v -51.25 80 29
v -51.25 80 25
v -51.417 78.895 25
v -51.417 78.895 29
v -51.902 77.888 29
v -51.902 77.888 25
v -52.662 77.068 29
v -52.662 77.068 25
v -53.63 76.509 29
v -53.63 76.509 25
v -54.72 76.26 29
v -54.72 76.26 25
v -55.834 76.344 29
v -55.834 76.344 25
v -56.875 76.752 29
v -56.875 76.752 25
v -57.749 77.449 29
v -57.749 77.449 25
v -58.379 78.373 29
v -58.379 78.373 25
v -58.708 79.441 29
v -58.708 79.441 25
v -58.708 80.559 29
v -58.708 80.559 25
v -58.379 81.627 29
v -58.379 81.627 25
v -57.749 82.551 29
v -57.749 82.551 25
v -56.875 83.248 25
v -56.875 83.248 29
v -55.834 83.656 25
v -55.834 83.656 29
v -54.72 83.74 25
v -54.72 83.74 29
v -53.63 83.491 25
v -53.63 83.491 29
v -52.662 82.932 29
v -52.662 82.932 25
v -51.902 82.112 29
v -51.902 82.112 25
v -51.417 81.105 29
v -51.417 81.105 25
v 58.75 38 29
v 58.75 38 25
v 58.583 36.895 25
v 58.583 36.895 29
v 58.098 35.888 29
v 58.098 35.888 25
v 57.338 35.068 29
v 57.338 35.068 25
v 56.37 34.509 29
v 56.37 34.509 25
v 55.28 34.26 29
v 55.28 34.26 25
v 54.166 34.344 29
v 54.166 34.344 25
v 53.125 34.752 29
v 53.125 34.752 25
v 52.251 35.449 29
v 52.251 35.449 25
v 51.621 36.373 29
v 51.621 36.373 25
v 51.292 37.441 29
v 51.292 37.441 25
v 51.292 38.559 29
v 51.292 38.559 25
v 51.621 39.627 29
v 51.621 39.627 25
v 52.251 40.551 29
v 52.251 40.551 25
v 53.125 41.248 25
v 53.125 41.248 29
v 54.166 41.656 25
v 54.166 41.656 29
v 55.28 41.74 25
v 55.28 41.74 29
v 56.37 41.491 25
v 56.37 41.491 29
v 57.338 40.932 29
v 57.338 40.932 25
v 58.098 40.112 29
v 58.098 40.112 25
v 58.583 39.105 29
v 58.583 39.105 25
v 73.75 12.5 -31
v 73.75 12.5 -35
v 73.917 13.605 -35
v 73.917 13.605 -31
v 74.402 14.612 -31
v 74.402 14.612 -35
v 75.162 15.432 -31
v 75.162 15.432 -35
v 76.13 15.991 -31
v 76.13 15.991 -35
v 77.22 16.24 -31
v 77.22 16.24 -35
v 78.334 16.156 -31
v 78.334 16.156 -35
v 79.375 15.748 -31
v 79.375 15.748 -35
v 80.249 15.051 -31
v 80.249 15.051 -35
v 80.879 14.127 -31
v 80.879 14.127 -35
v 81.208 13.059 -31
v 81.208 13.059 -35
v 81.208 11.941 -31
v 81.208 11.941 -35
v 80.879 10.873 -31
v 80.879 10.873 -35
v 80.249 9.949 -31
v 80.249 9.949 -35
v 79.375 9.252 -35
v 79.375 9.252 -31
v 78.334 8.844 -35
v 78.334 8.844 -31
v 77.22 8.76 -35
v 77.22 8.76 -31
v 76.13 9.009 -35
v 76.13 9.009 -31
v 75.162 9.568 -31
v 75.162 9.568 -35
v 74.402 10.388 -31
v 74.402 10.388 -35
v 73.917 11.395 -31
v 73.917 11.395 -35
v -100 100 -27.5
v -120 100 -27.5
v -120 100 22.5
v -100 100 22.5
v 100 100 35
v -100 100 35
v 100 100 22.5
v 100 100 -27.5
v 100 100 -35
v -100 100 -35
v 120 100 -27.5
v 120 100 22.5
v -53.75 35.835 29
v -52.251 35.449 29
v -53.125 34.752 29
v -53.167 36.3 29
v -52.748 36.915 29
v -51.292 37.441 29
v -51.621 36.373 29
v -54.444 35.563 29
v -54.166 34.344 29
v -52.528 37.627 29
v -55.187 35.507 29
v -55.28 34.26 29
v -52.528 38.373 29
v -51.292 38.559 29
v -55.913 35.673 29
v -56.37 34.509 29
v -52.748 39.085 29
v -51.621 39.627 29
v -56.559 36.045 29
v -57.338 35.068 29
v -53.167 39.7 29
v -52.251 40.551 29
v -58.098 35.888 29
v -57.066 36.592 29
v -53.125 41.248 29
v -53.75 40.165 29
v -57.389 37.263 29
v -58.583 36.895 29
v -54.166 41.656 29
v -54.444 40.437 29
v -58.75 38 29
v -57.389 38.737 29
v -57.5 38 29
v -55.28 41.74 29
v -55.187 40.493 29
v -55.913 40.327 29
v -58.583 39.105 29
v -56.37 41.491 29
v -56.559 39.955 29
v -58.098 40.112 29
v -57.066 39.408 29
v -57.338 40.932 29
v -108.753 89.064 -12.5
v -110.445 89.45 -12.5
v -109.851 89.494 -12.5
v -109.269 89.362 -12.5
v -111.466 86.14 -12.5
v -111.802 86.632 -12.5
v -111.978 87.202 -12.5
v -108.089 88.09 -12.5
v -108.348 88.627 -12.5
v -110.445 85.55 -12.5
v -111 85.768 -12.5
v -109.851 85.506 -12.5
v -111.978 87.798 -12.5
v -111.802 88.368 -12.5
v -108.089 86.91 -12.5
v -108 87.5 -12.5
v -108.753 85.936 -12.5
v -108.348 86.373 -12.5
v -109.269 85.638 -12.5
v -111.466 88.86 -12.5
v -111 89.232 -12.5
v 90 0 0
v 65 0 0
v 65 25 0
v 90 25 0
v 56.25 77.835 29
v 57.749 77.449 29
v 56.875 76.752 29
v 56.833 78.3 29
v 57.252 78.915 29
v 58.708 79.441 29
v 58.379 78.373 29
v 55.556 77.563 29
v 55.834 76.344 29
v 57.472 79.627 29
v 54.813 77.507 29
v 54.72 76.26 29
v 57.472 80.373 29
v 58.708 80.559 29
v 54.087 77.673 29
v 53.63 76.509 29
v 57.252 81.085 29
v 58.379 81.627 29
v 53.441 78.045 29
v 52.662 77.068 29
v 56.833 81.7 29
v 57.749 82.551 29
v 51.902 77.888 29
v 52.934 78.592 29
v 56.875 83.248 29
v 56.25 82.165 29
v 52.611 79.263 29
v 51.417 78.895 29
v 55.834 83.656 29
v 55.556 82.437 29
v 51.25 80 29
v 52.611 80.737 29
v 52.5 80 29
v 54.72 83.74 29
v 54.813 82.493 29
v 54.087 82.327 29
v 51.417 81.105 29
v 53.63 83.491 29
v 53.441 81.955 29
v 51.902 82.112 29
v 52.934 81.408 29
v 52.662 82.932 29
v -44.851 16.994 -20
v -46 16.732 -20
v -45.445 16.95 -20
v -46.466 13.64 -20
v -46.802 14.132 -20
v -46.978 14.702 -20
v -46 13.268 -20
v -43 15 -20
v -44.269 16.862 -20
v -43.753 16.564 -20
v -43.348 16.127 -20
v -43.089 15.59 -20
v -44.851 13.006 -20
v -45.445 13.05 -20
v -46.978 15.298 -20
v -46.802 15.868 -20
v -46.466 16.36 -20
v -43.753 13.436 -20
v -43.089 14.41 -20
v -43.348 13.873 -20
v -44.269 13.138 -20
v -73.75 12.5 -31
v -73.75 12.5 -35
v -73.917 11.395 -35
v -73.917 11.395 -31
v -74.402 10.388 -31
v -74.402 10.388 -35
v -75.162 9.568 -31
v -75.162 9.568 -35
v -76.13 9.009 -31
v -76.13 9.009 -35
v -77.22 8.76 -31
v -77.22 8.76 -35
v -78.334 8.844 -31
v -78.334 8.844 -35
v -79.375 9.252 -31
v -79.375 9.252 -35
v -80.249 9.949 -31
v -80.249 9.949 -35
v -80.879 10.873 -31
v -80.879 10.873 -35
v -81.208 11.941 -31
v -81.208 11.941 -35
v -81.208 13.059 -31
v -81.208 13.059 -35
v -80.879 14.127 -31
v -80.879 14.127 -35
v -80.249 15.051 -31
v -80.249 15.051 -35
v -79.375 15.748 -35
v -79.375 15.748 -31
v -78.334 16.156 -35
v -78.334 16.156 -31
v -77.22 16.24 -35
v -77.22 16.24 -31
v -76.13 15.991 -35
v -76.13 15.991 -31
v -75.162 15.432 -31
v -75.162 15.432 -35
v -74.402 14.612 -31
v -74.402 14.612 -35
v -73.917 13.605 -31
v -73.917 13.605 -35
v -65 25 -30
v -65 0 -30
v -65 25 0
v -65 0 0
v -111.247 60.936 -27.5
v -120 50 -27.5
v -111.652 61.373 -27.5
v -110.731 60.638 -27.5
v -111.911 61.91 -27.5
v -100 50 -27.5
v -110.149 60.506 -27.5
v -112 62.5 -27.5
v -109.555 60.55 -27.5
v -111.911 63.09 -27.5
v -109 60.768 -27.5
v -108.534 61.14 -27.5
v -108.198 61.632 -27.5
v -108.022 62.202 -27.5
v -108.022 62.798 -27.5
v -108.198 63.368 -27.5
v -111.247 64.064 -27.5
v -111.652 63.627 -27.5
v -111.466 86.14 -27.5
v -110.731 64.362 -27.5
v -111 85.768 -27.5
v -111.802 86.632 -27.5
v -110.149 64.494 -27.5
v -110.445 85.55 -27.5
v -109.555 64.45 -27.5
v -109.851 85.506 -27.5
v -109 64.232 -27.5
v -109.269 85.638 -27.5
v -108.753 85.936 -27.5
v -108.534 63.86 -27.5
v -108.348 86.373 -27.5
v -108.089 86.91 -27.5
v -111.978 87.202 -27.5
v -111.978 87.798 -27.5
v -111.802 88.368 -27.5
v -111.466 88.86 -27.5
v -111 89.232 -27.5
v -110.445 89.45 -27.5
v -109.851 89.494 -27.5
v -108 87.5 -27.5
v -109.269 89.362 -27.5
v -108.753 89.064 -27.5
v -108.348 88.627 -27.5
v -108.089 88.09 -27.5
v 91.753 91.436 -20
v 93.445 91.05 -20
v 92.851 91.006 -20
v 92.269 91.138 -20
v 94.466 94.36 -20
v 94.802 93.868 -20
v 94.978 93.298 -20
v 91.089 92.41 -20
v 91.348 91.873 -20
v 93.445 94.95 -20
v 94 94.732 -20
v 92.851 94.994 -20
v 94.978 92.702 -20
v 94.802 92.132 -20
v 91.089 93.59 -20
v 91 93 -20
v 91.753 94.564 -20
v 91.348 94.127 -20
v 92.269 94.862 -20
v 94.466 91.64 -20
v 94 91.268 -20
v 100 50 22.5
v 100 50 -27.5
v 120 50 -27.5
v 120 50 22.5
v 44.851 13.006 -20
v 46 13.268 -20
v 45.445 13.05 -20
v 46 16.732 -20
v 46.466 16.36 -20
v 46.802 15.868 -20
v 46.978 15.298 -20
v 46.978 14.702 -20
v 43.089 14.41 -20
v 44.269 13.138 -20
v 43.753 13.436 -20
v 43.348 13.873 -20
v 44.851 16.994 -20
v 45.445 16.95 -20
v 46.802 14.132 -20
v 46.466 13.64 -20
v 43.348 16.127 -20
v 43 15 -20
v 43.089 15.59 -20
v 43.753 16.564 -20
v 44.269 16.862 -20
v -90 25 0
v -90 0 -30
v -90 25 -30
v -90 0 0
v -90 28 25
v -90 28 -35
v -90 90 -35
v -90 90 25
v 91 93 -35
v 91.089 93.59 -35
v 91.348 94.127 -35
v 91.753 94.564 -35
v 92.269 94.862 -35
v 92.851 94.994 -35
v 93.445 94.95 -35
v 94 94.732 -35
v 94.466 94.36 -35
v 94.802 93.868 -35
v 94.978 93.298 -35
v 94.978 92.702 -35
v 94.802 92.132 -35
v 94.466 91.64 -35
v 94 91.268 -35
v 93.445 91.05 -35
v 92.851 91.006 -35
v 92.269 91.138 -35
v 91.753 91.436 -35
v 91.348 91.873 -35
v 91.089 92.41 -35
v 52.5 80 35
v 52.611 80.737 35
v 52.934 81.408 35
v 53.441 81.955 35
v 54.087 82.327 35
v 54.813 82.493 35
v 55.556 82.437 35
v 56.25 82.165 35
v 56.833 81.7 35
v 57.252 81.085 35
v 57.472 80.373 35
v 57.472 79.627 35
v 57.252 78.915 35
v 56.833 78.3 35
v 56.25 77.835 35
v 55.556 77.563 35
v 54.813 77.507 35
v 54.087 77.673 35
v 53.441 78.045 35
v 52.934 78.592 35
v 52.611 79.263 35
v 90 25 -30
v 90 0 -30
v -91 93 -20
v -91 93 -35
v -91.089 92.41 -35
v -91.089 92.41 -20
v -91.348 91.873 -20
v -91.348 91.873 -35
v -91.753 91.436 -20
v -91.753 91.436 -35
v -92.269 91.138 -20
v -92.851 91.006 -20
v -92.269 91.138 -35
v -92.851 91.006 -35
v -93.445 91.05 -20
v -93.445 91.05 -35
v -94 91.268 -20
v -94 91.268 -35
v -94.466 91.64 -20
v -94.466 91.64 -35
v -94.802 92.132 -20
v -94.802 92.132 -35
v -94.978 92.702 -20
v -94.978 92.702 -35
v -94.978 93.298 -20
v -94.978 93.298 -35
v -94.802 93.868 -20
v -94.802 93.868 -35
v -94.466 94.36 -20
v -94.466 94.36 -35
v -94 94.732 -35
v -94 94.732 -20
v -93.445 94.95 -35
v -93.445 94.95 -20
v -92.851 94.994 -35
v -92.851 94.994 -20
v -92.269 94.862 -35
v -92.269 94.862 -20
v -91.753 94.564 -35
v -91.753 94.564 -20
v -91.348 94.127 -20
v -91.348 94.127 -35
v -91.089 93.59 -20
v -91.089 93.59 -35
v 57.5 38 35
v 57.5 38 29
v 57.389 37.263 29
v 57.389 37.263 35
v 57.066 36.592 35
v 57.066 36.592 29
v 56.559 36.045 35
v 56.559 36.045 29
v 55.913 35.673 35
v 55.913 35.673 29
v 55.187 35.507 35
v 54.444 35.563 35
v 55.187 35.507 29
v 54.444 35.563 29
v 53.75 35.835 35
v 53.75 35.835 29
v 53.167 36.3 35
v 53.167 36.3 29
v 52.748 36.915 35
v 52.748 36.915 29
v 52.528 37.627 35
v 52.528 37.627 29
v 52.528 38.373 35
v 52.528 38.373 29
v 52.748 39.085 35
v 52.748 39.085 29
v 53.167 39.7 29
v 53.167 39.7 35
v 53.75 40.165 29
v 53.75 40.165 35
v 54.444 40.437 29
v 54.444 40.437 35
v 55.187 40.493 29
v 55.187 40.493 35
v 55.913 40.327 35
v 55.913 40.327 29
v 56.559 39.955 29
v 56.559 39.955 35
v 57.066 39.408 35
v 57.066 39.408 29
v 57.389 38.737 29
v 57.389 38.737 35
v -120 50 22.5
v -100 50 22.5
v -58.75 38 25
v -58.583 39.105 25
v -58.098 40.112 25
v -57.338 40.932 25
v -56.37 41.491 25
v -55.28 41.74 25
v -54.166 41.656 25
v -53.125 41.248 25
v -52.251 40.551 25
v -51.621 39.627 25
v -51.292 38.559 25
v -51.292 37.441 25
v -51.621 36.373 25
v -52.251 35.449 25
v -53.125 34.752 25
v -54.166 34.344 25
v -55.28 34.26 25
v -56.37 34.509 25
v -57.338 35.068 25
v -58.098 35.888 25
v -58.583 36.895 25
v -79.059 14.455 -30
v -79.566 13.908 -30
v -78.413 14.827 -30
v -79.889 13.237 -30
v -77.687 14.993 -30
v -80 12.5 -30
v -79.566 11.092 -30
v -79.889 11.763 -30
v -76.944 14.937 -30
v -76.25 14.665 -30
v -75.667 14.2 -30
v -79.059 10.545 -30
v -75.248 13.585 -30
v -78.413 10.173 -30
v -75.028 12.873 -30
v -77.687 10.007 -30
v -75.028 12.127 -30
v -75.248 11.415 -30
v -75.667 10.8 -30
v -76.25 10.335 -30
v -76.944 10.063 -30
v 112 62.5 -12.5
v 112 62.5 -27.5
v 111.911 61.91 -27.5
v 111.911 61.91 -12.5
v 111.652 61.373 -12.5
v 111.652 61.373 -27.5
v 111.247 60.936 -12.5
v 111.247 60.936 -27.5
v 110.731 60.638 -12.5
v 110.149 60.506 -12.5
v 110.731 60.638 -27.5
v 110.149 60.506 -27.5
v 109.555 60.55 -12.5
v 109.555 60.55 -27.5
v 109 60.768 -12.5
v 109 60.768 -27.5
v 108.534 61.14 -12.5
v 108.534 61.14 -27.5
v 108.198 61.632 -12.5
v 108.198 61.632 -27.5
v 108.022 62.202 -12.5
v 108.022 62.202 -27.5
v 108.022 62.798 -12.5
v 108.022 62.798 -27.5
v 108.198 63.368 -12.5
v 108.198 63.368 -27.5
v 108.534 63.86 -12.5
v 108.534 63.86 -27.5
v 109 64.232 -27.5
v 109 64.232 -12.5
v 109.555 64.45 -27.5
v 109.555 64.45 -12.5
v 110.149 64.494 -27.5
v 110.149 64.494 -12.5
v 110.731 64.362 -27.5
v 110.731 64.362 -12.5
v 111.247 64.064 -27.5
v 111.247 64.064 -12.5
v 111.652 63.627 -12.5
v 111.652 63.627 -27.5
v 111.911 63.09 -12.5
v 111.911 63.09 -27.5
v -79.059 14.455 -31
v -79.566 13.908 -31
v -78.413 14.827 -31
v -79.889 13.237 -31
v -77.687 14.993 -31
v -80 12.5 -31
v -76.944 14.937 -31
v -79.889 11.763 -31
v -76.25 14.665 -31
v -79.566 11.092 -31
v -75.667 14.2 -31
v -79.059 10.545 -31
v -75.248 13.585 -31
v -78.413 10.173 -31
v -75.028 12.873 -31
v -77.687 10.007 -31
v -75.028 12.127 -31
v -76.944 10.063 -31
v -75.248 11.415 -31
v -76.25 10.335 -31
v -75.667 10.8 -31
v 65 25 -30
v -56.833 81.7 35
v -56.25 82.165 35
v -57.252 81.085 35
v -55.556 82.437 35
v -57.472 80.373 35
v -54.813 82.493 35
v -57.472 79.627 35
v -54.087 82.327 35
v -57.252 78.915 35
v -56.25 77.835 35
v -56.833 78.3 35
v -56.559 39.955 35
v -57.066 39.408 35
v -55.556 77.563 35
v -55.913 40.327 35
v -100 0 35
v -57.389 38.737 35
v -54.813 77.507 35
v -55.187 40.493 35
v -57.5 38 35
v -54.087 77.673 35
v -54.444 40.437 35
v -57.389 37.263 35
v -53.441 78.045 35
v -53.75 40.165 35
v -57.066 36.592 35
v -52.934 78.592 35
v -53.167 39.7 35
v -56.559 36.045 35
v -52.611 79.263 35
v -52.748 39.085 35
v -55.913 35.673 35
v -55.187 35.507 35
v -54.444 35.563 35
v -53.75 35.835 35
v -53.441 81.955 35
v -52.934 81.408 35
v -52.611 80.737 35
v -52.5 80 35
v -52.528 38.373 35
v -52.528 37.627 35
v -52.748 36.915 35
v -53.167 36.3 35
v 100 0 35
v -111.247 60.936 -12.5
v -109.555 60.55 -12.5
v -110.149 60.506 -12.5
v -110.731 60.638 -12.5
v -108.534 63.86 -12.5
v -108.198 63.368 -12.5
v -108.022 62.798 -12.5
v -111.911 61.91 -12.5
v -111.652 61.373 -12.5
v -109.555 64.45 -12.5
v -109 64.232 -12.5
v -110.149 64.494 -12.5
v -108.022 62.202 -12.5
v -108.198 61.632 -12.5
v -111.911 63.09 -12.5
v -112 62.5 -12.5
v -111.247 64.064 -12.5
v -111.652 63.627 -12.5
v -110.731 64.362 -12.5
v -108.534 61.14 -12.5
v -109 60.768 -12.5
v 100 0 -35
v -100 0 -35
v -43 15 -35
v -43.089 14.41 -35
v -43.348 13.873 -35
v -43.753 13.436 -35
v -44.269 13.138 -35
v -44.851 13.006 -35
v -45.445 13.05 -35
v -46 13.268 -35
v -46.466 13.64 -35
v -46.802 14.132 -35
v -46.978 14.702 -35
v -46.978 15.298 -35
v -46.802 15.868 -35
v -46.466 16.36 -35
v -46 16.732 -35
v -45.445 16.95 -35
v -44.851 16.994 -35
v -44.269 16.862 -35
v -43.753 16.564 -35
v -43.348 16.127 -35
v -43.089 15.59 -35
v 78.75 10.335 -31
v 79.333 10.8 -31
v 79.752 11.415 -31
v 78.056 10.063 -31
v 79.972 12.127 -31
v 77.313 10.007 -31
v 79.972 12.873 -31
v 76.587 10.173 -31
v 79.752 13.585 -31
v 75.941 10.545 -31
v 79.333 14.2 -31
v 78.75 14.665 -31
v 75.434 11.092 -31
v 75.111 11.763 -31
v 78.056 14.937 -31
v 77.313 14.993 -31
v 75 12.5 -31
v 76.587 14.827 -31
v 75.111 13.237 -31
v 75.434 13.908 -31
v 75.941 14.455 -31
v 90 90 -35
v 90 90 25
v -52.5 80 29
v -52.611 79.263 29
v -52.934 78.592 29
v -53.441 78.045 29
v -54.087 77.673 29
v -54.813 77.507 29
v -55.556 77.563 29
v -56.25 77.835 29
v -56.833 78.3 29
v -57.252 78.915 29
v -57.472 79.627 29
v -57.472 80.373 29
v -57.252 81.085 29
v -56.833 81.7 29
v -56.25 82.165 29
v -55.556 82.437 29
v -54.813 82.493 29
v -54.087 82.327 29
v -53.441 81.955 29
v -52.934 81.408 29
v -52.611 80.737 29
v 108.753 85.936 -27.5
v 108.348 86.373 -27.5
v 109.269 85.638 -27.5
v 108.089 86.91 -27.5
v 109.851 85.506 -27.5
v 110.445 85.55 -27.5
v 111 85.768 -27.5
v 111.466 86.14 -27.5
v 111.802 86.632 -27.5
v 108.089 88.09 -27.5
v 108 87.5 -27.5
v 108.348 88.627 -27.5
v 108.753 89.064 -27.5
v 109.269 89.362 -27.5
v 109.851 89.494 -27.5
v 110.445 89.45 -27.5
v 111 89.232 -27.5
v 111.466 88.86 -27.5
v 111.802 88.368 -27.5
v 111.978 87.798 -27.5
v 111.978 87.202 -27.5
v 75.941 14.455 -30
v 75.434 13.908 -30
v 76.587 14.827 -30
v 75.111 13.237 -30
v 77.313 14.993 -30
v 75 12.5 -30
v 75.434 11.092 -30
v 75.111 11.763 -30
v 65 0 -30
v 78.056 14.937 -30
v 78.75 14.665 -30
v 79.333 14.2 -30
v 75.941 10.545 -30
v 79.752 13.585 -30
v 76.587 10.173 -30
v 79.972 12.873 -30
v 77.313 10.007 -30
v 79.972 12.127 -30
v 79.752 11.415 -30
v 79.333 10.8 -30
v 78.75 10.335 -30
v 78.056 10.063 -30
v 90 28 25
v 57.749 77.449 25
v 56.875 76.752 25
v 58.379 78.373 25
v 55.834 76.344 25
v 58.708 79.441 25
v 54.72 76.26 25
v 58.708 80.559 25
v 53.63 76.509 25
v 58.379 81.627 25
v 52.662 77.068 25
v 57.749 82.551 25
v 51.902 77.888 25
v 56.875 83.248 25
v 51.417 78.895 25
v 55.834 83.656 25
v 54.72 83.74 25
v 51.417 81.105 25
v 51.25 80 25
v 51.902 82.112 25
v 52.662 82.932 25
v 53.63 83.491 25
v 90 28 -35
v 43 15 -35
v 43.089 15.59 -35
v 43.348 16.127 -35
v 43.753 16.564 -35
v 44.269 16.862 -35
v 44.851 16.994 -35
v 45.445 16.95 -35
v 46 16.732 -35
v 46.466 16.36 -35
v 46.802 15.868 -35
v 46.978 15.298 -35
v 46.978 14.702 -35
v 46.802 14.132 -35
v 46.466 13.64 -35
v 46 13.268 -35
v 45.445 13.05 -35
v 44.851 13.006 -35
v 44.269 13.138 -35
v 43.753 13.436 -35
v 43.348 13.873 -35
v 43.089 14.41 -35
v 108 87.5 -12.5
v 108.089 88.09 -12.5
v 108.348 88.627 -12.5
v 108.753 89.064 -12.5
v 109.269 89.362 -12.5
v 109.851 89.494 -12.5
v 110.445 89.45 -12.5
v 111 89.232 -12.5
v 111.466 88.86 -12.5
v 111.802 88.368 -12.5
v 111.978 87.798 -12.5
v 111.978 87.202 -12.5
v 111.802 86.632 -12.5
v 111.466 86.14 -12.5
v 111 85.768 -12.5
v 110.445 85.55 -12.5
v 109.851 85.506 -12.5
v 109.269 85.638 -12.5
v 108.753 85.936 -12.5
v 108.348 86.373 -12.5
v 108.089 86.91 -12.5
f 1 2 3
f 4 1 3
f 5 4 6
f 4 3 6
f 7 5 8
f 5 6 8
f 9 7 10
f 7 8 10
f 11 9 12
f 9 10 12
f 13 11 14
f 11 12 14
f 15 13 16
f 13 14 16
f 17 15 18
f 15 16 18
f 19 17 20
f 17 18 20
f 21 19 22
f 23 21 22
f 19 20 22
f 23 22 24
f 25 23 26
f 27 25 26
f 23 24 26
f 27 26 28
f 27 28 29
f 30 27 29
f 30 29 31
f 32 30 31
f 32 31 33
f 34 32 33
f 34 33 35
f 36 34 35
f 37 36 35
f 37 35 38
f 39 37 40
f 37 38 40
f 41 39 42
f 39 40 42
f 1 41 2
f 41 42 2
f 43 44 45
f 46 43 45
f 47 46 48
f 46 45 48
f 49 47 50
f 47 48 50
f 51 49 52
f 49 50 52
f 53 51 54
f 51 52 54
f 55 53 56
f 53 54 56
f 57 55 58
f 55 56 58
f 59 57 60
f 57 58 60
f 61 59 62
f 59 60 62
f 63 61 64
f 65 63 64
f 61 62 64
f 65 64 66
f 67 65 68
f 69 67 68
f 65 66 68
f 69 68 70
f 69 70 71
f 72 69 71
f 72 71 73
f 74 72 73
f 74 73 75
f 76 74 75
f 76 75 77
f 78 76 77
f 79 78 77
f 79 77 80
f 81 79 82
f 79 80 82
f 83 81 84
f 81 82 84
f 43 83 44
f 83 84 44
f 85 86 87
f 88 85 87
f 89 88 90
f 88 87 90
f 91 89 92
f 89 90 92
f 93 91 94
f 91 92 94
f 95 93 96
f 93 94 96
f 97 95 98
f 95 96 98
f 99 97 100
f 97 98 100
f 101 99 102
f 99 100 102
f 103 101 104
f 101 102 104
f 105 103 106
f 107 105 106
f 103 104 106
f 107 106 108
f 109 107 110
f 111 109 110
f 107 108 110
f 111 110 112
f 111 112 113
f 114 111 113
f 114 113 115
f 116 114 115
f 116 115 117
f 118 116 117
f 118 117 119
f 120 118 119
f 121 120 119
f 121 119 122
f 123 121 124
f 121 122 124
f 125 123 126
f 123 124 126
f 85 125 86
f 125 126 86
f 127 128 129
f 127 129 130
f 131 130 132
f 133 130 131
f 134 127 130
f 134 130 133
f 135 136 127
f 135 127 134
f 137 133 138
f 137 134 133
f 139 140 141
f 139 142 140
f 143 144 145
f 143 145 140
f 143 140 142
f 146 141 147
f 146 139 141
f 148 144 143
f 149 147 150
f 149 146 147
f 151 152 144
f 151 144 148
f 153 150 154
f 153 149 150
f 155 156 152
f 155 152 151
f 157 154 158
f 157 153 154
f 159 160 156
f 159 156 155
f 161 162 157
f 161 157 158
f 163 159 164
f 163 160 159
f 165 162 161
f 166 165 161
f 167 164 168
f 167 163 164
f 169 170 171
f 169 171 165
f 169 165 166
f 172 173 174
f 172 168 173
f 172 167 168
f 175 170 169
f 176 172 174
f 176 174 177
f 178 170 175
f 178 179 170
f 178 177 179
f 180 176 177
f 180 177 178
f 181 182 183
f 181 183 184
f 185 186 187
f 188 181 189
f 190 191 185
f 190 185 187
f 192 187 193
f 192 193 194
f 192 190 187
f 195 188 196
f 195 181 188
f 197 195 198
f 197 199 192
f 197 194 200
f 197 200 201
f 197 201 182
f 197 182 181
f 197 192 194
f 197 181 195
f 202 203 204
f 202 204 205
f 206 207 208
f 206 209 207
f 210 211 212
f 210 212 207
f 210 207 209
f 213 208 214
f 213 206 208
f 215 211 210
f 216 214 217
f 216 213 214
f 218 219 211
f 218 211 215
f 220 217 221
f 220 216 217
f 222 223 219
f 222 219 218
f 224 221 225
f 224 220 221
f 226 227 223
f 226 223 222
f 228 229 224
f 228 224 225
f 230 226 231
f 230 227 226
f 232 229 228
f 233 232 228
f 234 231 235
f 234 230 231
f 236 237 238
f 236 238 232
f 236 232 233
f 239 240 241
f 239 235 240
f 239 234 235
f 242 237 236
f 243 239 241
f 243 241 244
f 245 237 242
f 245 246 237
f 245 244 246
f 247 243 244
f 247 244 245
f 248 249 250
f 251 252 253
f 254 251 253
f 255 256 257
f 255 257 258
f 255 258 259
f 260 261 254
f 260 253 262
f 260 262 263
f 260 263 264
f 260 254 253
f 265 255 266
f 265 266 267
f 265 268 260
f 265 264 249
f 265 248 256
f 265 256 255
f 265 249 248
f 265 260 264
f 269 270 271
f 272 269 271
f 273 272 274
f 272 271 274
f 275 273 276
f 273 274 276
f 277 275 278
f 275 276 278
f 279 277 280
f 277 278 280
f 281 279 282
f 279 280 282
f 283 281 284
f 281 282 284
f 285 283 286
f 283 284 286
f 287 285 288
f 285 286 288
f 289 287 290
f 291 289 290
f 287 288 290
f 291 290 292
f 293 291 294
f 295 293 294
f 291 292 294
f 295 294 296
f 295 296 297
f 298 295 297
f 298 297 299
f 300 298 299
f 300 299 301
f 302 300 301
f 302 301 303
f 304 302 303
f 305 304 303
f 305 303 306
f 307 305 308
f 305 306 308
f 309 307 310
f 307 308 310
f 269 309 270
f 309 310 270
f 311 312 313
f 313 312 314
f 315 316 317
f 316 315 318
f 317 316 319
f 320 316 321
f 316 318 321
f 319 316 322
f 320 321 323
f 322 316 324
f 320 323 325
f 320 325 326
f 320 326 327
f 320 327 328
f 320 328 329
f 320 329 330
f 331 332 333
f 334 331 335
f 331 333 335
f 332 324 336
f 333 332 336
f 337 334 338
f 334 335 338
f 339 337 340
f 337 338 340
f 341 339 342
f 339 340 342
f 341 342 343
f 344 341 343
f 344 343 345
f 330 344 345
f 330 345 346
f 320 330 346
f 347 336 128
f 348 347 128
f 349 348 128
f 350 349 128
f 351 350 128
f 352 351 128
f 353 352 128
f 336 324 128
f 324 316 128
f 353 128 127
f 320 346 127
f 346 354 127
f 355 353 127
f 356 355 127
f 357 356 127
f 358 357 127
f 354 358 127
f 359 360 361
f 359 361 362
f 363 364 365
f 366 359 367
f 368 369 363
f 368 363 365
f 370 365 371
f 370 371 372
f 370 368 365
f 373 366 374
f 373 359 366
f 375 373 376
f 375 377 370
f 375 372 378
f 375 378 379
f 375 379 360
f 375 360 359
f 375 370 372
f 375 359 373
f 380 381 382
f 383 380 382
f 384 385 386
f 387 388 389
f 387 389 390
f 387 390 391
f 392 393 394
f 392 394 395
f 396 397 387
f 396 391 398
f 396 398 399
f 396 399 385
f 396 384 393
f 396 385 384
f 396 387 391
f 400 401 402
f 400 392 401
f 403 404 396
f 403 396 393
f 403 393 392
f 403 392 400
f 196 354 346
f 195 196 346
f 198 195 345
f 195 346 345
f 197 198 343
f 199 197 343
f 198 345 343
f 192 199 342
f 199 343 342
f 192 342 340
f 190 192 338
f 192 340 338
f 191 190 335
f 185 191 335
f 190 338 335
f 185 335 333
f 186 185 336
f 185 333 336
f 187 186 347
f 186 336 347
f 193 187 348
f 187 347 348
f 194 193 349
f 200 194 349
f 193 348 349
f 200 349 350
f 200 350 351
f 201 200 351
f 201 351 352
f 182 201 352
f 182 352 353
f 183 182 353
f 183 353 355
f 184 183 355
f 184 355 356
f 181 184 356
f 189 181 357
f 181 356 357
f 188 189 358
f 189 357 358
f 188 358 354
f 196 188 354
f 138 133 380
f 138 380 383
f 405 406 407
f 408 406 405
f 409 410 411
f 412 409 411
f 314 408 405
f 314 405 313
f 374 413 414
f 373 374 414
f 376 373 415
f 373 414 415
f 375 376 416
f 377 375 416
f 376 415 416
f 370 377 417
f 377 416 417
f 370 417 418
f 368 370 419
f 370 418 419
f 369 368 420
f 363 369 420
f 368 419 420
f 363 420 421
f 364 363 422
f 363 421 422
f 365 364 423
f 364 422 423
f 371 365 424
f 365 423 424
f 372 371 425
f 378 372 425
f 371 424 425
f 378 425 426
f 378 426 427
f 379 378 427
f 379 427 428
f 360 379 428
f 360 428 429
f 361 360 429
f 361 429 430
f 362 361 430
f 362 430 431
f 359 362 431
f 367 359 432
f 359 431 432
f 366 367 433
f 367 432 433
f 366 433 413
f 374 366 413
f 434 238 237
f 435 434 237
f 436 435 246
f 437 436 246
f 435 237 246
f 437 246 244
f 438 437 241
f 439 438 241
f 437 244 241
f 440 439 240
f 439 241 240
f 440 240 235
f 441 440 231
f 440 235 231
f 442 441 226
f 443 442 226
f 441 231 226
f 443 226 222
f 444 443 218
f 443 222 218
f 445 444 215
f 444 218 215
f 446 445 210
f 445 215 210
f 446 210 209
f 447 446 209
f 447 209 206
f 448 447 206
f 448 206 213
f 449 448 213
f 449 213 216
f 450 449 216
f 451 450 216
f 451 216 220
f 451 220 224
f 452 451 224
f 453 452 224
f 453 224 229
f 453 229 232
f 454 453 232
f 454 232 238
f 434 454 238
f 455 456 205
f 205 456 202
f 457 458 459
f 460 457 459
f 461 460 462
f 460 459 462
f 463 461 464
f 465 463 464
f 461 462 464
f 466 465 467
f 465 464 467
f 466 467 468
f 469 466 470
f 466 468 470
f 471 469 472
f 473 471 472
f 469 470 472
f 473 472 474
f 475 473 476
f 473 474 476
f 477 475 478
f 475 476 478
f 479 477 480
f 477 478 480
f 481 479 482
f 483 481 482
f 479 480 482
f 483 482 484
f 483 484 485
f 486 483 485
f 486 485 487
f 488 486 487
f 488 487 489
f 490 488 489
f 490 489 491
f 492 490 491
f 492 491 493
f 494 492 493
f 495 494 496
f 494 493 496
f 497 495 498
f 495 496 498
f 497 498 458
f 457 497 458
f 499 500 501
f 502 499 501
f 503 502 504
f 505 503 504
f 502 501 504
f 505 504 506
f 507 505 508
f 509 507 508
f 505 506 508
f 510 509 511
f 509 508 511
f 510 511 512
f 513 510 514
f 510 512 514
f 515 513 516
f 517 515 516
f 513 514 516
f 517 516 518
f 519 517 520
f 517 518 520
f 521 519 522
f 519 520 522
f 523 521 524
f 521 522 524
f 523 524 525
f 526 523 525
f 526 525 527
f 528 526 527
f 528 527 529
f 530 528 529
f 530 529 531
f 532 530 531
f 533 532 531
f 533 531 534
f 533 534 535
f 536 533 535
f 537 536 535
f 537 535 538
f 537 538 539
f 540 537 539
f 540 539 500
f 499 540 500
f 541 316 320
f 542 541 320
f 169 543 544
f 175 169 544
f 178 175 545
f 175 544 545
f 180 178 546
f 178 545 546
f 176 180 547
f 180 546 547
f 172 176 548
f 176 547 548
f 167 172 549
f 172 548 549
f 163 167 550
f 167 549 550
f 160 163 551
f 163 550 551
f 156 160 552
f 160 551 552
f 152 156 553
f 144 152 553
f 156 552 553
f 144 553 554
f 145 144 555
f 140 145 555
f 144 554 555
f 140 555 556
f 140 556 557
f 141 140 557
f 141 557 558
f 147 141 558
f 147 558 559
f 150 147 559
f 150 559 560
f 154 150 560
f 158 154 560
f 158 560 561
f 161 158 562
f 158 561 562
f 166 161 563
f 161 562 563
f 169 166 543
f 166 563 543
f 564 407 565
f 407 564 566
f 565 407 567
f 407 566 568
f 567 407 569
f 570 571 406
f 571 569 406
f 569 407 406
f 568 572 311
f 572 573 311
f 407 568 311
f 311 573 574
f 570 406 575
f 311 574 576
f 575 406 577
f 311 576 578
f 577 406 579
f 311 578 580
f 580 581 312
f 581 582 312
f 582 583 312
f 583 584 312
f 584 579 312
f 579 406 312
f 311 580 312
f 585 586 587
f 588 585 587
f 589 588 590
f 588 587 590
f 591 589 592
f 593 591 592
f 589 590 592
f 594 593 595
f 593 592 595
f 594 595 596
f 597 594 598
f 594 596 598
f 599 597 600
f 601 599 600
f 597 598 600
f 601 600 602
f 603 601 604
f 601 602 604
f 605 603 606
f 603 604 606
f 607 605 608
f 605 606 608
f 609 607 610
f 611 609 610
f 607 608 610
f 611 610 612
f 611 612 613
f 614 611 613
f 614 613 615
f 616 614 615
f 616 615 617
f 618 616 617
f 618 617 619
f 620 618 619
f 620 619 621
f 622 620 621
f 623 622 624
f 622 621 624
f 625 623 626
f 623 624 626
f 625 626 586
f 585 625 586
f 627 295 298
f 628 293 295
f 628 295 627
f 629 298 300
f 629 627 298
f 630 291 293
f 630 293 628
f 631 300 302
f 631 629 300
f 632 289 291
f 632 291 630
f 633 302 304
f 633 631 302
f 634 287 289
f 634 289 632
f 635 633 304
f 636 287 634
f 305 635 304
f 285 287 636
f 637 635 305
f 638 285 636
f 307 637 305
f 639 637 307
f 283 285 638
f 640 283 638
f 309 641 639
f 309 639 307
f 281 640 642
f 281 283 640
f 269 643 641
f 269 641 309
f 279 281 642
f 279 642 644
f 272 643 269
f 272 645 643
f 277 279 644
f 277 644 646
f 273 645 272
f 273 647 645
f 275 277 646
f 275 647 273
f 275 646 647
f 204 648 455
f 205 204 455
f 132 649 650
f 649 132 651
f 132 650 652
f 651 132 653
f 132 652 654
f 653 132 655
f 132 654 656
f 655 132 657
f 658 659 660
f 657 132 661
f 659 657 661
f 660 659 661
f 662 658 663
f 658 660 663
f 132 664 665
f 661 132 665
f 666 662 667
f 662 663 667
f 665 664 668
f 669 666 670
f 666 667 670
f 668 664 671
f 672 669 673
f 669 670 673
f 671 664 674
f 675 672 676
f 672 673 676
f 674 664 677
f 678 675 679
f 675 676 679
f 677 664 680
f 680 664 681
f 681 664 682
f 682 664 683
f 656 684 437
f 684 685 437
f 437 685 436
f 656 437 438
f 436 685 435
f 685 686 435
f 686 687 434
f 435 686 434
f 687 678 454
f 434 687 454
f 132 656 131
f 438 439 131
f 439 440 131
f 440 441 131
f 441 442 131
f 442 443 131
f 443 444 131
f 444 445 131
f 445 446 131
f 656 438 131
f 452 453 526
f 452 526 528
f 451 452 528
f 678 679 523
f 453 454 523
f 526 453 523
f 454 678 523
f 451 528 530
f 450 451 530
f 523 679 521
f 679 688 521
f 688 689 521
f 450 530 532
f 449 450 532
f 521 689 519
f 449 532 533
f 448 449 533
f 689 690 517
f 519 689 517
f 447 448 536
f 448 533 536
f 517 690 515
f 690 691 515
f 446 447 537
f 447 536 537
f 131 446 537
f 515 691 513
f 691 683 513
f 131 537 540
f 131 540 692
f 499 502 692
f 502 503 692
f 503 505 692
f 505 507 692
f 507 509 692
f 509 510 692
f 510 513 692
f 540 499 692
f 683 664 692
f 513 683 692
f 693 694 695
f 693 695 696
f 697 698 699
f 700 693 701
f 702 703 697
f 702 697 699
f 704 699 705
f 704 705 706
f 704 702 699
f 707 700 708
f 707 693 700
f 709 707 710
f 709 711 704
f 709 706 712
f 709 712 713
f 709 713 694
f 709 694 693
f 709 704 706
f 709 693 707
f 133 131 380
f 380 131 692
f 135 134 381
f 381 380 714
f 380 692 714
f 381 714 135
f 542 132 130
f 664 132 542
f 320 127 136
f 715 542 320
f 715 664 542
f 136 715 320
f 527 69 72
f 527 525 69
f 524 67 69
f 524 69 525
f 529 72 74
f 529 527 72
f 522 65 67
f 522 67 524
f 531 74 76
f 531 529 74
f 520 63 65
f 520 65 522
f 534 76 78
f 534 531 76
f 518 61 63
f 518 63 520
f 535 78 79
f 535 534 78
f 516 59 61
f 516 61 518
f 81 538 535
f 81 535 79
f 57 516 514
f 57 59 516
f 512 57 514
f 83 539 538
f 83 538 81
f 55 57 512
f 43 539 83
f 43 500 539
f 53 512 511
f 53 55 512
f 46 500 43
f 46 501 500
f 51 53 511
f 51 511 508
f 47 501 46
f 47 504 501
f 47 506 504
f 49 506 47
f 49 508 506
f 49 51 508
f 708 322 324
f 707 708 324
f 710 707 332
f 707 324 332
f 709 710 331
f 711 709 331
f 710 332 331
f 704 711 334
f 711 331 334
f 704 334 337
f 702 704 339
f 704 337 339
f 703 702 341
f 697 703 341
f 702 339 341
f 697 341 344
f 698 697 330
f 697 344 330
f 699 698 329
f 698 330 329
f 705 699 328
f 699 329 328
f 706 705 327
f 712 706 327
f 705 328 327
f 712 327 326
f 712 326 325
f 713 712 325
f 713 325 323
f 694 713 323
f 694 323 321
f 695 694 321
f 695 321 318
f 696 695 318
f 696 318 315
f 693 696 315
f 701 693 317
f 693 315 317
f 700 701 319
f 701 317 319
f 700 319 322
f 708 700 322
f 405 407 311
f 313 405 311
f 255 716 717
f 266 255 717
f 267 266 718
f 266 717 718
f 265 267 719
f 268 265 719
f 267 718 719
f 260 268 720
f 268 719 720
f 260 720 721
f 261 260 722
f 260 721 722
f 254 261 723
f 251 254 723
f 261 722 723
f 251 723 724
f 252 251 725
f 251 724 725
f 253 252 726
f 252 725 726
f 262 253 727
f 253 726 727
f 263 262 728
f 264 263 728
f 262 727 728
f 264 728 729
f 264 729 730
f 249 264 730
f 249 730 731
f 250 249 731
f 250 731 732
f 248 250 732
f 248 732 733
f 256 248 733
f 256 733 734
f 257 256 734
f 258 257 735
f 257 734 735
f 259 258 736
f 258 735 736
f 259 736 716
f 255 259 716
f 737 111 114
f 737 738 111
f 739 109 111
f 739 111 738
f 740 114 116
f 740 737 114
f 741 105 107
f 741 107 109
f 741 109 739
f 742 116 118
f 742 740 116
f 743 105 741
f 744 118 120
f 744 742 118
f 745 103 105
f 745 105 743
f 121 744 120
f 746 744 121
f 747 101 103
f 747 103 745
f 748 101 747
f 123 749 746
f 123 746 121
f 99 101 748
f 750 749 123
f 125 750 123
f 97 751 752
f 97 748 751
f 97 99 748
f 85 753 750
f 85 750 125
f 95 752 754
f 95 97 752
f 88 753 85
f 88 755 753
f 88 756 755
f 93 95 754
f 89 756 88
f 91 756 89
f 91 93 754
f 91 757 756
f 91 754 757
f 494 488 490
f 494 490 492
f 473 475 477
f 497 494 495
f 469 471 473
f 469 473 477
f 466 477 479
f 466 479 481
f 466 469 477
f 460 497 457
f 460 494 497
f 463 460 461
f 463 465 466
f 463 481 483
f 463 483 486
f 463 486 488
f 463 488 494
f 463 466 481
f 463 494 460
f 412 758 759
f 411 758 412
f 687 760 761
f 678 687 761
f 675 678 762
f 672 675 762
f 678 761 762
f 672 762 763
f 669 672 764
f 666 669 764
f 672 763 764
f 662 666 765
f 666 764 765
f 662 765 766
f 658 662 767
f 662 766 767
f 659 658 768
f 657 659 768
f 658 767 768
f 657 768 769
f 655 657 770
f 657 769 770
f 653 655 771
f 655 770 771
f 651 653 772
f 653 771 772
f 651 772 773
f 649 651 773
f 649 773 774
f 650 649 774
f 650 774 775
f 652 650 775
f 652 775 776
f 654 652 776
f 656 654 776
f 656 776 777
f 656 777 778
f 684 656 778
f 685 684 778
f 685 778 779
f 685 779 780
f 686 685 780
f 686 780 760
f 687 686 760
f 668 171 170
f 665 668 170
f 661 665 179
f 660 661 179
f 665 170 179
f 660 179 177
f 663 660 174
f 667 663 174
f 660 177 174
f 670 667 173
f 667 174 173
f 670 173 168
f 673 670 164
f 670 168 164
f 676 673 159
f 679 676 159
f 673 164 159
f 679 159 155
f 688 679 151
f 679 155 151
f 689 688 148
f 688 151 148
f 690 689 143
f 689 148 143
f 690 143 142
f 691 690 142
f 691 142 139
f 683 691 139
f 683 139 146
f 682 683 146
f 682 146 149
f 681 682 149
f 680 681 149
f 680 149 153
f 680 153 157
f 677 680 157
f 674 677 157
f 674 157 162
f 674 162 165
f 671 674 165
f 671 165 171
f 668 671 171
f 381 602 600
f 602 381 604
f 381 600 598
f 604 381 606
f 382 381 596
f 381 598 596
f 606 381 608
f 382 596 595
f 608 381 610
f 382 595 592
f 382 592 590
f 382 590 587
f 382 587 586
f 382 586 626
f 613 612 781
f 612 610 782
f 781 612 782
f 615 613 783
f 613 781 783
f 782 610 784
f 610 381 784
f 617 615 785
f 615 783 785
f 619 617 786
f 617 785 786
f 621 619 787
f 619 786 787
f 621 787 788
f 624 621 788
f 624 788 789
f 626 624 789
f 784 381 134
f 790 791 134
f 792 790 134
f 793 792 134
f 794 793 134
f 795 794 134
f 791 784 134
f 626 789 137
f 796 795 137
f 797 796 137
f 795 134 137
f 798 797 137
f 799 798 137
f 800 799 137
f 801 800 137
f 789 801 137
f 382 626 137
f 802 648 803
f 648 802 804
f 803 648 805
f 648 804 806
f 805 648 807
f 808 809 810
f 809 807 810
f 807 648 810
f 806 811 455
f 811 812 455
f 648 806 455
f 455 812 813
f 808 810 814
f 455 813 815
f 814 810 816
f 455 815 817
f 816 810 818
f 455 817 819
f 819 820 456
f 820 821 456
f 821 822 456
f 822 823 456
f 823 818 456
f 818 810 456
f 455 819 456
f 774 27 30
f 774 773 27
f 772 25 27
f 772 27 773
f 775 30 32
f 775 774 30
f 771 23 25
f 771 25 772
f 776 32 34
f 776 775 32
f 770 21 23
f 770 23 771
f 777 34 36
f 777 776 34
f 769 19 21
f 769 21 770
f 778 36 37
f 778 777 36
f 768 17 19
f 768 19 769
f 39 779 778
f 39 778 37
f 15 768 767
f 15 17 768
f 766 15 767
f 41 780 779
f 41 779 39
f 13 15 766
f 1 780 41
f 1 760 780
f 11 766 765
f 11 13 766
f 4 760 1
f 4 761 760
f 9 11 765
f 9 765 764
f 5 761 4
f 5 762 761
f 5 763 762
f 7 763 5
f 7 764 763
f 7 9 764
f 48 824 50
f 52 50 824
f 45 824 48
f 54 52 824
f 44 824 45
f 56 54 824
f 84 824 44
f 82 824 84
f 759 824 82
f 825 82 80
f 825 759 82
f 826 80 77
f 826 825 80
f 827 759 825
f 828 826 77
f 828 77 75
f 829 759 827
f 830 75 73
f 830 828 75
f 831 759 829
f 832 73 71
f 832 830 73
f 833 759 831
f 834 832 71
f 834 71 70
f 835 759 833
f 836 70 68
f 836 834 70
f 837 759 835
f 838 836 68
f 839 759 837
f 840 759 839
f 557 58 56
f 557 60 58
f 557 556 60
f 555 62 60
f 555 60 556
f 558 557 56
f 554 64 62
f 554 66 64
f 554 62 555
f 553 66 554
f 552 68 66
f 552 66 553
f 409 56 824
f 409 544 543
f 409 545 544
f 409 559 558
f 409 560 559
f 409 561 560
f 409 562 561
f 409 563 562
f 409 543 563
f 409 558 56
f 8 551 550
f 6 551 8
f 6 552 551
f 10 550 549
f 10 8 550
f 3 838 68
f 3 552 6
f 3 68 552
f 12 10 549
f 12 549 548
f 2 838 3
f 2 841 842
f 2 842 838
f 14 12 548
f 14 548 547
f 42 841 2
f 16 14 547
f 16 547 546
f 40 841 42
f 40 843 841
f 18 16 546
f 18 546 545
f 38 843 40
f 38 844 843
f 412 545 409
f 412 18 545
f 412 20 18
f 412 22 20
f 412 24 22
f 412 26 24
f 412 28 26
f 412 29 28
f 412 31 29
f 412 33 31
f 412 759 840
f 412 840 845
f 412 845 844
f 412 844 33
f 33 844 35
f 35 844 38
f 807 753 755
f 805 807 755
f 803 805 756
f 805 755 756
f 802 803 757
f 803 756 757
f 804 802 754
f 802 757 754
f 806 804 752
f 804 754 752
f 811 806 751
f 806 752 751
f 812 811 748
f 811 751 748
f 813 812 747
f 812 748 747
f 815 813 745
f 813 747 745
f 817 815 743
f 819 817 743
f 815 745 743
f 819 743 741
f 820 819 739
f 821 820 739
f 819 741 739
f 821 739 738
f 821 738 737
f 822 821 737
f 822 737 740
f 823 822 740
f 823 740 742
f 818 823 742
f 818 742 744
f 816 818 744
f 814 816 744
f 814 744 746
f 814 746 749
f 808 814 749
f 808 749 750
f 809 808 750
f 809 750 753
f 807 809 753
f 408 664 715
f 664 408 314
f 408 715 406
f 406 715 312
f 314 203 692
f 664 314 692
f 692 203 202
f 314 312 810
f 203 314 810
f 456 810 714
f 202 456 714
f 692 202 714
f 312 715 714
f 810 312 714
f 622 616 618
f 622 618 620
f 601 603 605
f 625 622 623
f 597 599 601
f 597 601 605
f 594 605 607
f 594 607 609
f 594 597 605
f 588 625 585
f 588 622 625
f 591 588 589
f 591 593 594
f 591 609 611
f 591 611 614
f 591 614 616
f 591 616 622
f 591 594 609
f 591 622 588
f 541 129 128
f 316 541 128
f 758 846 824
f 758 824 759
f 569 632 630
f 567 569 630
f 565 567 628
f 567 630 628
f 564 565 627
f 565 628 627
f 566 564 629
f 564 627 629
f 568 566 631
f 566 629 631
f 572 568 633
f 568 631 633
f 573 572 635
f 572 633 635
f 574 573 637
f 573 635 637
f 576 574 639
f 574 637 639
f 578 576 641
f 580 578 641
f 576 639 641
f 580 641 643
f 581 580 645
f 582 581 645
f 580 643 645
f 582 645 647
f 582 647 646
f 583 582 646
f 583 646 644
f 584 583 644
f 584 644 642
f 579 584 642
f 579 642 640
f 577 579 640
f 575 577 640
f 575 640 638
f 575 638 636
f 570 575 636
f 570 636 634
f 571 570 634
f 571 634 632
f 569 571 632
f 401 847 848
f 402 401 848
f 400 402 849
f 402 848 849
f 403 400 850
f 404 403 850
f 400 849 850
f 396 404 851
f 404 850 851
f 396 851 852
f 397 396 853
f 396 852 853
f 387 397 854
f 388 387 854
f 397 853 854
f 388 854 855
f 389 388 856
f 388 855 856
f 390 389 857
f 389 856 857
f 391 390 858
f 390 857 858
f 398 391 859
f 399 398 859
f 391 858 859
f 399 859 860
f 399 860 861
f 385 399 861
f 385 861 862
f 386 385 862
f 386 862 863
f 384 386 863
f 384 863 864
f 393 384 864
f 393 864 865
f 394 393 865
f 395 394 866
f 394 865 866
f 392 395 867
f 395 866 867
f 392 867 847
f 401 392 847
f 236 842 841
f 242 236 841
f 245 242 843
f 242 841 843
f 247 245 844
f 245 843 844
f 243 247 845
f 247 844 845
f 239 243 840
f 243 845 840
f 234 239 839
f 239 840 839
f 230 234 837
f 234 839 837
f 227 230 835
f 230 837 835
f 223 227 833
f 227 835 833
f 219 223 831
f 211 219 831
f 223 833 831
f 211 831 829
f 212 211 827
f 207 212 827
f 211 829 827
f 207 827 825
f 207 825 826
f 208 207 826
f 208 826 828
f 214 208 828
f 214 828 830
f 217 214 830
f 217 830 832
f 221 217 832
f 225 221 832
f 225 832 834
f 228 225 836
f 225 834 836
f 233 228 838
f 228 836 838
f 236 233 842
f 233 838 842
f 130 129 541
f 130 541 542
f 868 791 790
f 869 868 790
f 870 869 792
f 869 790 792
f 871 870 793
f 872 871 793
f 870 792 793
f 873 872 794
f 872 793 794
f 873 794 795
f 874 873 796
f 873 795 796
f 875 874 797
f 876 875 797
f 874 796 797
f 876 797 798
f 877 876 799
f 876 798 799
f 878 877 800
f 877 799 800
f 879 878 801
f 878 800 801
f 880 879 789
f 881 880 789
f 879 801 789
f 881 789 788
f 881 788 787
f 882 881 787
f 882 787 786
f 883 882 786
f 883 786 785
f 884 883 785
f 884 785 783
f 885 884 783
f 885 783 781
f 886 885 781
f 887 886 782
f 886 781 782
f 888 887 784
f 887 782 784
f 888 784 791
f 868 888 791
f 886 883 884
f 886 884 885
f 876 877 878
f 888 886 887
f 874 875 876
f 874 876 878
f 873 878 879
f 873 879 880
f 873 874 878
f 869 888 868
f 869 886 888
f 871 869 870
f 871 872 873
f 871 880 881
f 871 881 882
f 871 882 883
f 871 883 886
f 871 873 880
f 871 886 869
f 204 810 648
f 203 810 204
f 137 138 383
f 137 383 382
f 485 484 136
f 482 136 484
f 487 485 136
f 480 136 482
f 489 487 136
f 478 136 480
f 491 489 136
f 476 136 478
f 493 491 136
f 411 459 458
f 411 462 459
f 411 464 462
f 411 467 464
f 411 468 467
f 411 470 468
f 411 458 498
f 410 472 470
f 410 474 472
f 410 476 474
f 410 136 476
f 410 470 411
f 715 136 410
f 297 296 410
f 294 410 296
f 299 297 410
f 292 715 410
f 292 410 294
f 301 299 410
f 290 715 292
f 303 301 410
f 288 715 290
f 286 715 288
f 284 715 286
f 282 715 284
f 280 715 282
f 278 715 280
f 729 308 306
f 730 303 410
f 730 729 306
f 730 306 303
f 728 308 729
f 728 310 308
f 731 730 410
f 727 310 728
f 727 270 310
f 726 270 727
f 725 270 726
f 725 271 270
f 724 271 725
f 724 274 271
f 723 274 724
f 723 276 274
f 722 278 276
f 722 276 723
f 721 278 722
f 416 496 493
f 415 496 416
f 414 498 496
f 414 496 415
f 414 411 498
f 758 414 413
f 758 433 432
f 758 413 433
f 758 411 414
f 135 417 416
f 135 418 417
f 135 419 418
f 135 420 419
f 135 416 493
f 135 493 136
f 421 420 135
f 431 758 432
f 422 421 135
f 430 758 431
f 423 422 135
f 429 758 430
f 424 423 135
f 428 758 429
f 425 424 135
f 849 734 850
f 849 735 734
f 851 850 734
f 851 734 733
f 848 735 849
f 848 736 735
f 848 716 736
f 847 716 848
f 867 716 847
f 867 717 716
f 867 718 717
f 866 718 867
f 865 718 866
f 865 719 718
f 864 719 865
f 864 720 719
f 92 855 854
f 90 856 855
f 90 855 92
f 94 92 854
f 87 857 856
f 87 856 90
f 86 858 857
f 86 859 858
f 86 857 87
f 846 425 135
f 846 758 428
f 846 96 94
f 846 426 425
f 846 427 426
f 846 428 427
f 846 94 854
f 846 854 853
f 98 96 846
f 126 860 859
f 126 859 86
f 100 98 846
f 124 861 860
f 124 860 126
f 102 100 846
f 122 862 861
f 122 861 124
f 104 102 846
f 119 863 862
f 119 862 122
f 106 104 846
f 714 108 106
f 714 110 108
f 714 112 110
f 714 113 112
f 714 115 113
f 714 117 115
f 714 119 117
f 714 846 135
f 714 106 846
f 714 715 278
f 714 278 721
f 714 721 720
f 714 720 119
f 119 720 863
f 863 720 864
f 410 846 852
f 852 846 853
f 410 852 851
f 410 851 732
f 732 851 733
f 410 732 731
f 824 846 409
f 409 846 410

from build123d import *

# Parameters (mm, degrees)
SKETCH1_W           = 200
SKETCH1_H           = 70
BOSS_EXTRUDE1_DEPTH = 100
SKETCH2_W           = 20
SKETCH2_H           = 50
BOSS_EXTRUDE3_DEPTH = 50
SKETCH3_W           = 25
SKETCH3_H           = 30
CUT_EXTRUDE1_DEPTH  = 25
SKETCH4_R           = 2.5
CUT_EXTRUDE2_DEPTH  = 15
SKETCH5_R           = 3.75
CUT_EXTRUDE3_DEPTH  = 4
SKETCH6_R           = 2
CUT_EXTRUDE4_DEPTH  = 15
SKETCH7_W           = 180
SKETCH7_H           = 62
CUT_EXTRUDE5_DEPTH  = 60
SKETCH8_R           = 2
CUT_EXTRUDE6_DEPTH  = 15
SKETCH9_R           = 2.5
CUT_EXTRUDE7_DEPTH  = 168.332005307
SKETCH10_R          = 3.75
CUT_EXTRUDE8_DEPTH  = 4


with BuildPart() as part:
    # Sketch1 → Boss-Extrude1 (new body)
    with BuildSketch(Plane(origin=(0, 0, 0), x_dir=(1, 0, 0), z_dir=(0, 1, 0))):
        Rectangle(SKETCH1_W, SKETCH1_H)
    extrude(amount=BOSS_EXTRUDE1_DEPTH)

    # Sketch2 → Boss-Extrude3 (add)
    with BuildSketch(Plane(origin=(0, 100, 0), x_dir=(1, 0, 0), z_dir=(0, 1, 0))):
        with Locations((-110, 2.5)):
            Rectangle(SKETCH2_W, SKETCH2_H)
        with Locations((110, 2.5)):
            Rectangle(SKETCH2_W, SKETCH2_H)
    extrude(amount=-BOSS_EXTRUDE3_DEPTH)

    # Sketch3 → Cut-Extrude1 (cut)
    with BuildSketch(Plane.XZ):
        with Locations((77.5, -15)):
            Rectangle(SKETCH3_W, SKETCH3_H)
        with Locations((-77.5, -15)):
            Rectangle(SKETCH3_W, SKETCH3_H)
    extrude(amount=-CUT_EXTRUDE1_DEPTH, mode=Mode.SUBTRACT)

    # Sketch4 → Cut-Extrude2 (cut)
    with BuildSketch(Plane(origin=(0, 0, -35), x_dir=(-1, 0, 0), z_dir=(0, 0, -1))):
        with Locations((-77.5, 12.5)):
            Circle(SKETCH4_R)
        with Locations((77.5, 12.5)):
            Circle(SKETCH4_R)
    extrude(amount=-CUT_EXTRUDE2_DEPTH, mode=Mode.SUBTRACT)

    # Sketch5 → Cut-Extrude3 (cut)
    with BuildSketch(Plane(origin=(0, 0, -35), x_dir=(-1, 0, 0), z_dir=(0, 0, -1))):
        with Locations((-77.5, 12.5)):
            Circle(SKETCH5_R)
        with Locations(Location((77.5, 12.5, 0), (0, 0, 180))):
            Circle(SKETCH5_R)
    extrude(amount=-CUT_EXTRUDE3_DEPTH, mode=Mode.SUBTRACT)

    # Sketch6 → Cut-Extrude4 (cut)
    with BuildSketch(Plane(origin=(0, 0, -27.5), x_dir=(-1, 0, 0), z_dir=(0, 0, -1))):
        with Locations((-110, 87.5)):
            Circle(SKETCH6_R)
        with Locations(Location((-110, 62.5, 0), (0, 0, 180))):
            Circle(SKETCH6_R)
        with Locations((110, 62.5)):
            Circle(SKETCH6_R)
        with Locations(Location((110, 87.5, 0), (0, 0, 180))):
            Circle(SKETCH6_R)
    extrude(amount=-CUT_EXTRUDE4_DEPTH, mode=Mode.SUBTRACT)

    # Sketch7 → Cut-Extrude5 (cut)
    with BuildSketch(Plane(origin=(0, 0, -35), x_dir=(-1, 0, 0), z_dir=(0, 0, -1))):
        with Locations((0, 59)):
            Rectangle(SKETCH7_W, SKETCH7_H)
    extrude(amount=-CUT_EXTRUDE5_DEPTH, mode=Mode.SUBTRACT)

    # Sketch8 → Cut-Extrude6 (cut)
    with BuildSketch(Plane(origin=(0, 0, -35), x_dir=(-1, 0, 0), z_dir=(0, 0, -1))):
        with Locations((-45, 15)):
            Circle(SKETCH8_R)
        with Locations(Location((45, 15, 0), (0, 0, 180))):
            Circle(SKETCH8_R)
        with Locations((-93, 93)):
            Circle(SKETCH8_R)
        with Locations(Location((93, 93, 0), (0, 0, 180))):
            Circle(SKETCH8_R)
    extrude(amount=-CUT_EXTRUDE6_DEPTH, mode=Mode.SUBTRACT)

    # Sketch9 → Cut-Extrude7 (cut, through all)
    with BuildSketch(Plane(origin=(0, 0, 25), x_dir=(-1, 0, 0), z_dir=(0, 0, -1))):
        with Locations((-55, 80)):
            Circle(SKETCH9_R)
        with Locations(Location((55, 80, 0), (0, 0, 180))):
            Circle(SKETCH9_R)
        with Locations((55, 38)):
            Circle(SKETCH9_R)
        with Locations(Location((-55, 38, 0), (0, 0, 180))):
            Circle(SKETCH9_R)
    extrude(amount=-CUT_EXTRUDE7_DEPTH, mode=Mode.SUBTRACT)

    # Sketch10 → Cut-Extrude8 (cut)
    with BuildSketch(Plane(origin=(0, 0, 25), x_dir=(-1, 0, 0), z_dir=(0, 0, -1))):
        with Locations((-55, 80)):
            Circle(SKETCH10_R)
        with Locations(Location((-55, 38, 0), (0, 0, 180))):
            Circle(SKETCH10_R)
        with Locations((55, 38)):
            Circle(SKETCH10_R)
        with Locations(Location((55, 80, 0), (0, 0, 180))):
            Circle(SKETCH10_R)
    extrude(amount=-CUT_EXTRUDE8_DEPTH, mode=Mode.SUBTRACT)


solid = part.part
